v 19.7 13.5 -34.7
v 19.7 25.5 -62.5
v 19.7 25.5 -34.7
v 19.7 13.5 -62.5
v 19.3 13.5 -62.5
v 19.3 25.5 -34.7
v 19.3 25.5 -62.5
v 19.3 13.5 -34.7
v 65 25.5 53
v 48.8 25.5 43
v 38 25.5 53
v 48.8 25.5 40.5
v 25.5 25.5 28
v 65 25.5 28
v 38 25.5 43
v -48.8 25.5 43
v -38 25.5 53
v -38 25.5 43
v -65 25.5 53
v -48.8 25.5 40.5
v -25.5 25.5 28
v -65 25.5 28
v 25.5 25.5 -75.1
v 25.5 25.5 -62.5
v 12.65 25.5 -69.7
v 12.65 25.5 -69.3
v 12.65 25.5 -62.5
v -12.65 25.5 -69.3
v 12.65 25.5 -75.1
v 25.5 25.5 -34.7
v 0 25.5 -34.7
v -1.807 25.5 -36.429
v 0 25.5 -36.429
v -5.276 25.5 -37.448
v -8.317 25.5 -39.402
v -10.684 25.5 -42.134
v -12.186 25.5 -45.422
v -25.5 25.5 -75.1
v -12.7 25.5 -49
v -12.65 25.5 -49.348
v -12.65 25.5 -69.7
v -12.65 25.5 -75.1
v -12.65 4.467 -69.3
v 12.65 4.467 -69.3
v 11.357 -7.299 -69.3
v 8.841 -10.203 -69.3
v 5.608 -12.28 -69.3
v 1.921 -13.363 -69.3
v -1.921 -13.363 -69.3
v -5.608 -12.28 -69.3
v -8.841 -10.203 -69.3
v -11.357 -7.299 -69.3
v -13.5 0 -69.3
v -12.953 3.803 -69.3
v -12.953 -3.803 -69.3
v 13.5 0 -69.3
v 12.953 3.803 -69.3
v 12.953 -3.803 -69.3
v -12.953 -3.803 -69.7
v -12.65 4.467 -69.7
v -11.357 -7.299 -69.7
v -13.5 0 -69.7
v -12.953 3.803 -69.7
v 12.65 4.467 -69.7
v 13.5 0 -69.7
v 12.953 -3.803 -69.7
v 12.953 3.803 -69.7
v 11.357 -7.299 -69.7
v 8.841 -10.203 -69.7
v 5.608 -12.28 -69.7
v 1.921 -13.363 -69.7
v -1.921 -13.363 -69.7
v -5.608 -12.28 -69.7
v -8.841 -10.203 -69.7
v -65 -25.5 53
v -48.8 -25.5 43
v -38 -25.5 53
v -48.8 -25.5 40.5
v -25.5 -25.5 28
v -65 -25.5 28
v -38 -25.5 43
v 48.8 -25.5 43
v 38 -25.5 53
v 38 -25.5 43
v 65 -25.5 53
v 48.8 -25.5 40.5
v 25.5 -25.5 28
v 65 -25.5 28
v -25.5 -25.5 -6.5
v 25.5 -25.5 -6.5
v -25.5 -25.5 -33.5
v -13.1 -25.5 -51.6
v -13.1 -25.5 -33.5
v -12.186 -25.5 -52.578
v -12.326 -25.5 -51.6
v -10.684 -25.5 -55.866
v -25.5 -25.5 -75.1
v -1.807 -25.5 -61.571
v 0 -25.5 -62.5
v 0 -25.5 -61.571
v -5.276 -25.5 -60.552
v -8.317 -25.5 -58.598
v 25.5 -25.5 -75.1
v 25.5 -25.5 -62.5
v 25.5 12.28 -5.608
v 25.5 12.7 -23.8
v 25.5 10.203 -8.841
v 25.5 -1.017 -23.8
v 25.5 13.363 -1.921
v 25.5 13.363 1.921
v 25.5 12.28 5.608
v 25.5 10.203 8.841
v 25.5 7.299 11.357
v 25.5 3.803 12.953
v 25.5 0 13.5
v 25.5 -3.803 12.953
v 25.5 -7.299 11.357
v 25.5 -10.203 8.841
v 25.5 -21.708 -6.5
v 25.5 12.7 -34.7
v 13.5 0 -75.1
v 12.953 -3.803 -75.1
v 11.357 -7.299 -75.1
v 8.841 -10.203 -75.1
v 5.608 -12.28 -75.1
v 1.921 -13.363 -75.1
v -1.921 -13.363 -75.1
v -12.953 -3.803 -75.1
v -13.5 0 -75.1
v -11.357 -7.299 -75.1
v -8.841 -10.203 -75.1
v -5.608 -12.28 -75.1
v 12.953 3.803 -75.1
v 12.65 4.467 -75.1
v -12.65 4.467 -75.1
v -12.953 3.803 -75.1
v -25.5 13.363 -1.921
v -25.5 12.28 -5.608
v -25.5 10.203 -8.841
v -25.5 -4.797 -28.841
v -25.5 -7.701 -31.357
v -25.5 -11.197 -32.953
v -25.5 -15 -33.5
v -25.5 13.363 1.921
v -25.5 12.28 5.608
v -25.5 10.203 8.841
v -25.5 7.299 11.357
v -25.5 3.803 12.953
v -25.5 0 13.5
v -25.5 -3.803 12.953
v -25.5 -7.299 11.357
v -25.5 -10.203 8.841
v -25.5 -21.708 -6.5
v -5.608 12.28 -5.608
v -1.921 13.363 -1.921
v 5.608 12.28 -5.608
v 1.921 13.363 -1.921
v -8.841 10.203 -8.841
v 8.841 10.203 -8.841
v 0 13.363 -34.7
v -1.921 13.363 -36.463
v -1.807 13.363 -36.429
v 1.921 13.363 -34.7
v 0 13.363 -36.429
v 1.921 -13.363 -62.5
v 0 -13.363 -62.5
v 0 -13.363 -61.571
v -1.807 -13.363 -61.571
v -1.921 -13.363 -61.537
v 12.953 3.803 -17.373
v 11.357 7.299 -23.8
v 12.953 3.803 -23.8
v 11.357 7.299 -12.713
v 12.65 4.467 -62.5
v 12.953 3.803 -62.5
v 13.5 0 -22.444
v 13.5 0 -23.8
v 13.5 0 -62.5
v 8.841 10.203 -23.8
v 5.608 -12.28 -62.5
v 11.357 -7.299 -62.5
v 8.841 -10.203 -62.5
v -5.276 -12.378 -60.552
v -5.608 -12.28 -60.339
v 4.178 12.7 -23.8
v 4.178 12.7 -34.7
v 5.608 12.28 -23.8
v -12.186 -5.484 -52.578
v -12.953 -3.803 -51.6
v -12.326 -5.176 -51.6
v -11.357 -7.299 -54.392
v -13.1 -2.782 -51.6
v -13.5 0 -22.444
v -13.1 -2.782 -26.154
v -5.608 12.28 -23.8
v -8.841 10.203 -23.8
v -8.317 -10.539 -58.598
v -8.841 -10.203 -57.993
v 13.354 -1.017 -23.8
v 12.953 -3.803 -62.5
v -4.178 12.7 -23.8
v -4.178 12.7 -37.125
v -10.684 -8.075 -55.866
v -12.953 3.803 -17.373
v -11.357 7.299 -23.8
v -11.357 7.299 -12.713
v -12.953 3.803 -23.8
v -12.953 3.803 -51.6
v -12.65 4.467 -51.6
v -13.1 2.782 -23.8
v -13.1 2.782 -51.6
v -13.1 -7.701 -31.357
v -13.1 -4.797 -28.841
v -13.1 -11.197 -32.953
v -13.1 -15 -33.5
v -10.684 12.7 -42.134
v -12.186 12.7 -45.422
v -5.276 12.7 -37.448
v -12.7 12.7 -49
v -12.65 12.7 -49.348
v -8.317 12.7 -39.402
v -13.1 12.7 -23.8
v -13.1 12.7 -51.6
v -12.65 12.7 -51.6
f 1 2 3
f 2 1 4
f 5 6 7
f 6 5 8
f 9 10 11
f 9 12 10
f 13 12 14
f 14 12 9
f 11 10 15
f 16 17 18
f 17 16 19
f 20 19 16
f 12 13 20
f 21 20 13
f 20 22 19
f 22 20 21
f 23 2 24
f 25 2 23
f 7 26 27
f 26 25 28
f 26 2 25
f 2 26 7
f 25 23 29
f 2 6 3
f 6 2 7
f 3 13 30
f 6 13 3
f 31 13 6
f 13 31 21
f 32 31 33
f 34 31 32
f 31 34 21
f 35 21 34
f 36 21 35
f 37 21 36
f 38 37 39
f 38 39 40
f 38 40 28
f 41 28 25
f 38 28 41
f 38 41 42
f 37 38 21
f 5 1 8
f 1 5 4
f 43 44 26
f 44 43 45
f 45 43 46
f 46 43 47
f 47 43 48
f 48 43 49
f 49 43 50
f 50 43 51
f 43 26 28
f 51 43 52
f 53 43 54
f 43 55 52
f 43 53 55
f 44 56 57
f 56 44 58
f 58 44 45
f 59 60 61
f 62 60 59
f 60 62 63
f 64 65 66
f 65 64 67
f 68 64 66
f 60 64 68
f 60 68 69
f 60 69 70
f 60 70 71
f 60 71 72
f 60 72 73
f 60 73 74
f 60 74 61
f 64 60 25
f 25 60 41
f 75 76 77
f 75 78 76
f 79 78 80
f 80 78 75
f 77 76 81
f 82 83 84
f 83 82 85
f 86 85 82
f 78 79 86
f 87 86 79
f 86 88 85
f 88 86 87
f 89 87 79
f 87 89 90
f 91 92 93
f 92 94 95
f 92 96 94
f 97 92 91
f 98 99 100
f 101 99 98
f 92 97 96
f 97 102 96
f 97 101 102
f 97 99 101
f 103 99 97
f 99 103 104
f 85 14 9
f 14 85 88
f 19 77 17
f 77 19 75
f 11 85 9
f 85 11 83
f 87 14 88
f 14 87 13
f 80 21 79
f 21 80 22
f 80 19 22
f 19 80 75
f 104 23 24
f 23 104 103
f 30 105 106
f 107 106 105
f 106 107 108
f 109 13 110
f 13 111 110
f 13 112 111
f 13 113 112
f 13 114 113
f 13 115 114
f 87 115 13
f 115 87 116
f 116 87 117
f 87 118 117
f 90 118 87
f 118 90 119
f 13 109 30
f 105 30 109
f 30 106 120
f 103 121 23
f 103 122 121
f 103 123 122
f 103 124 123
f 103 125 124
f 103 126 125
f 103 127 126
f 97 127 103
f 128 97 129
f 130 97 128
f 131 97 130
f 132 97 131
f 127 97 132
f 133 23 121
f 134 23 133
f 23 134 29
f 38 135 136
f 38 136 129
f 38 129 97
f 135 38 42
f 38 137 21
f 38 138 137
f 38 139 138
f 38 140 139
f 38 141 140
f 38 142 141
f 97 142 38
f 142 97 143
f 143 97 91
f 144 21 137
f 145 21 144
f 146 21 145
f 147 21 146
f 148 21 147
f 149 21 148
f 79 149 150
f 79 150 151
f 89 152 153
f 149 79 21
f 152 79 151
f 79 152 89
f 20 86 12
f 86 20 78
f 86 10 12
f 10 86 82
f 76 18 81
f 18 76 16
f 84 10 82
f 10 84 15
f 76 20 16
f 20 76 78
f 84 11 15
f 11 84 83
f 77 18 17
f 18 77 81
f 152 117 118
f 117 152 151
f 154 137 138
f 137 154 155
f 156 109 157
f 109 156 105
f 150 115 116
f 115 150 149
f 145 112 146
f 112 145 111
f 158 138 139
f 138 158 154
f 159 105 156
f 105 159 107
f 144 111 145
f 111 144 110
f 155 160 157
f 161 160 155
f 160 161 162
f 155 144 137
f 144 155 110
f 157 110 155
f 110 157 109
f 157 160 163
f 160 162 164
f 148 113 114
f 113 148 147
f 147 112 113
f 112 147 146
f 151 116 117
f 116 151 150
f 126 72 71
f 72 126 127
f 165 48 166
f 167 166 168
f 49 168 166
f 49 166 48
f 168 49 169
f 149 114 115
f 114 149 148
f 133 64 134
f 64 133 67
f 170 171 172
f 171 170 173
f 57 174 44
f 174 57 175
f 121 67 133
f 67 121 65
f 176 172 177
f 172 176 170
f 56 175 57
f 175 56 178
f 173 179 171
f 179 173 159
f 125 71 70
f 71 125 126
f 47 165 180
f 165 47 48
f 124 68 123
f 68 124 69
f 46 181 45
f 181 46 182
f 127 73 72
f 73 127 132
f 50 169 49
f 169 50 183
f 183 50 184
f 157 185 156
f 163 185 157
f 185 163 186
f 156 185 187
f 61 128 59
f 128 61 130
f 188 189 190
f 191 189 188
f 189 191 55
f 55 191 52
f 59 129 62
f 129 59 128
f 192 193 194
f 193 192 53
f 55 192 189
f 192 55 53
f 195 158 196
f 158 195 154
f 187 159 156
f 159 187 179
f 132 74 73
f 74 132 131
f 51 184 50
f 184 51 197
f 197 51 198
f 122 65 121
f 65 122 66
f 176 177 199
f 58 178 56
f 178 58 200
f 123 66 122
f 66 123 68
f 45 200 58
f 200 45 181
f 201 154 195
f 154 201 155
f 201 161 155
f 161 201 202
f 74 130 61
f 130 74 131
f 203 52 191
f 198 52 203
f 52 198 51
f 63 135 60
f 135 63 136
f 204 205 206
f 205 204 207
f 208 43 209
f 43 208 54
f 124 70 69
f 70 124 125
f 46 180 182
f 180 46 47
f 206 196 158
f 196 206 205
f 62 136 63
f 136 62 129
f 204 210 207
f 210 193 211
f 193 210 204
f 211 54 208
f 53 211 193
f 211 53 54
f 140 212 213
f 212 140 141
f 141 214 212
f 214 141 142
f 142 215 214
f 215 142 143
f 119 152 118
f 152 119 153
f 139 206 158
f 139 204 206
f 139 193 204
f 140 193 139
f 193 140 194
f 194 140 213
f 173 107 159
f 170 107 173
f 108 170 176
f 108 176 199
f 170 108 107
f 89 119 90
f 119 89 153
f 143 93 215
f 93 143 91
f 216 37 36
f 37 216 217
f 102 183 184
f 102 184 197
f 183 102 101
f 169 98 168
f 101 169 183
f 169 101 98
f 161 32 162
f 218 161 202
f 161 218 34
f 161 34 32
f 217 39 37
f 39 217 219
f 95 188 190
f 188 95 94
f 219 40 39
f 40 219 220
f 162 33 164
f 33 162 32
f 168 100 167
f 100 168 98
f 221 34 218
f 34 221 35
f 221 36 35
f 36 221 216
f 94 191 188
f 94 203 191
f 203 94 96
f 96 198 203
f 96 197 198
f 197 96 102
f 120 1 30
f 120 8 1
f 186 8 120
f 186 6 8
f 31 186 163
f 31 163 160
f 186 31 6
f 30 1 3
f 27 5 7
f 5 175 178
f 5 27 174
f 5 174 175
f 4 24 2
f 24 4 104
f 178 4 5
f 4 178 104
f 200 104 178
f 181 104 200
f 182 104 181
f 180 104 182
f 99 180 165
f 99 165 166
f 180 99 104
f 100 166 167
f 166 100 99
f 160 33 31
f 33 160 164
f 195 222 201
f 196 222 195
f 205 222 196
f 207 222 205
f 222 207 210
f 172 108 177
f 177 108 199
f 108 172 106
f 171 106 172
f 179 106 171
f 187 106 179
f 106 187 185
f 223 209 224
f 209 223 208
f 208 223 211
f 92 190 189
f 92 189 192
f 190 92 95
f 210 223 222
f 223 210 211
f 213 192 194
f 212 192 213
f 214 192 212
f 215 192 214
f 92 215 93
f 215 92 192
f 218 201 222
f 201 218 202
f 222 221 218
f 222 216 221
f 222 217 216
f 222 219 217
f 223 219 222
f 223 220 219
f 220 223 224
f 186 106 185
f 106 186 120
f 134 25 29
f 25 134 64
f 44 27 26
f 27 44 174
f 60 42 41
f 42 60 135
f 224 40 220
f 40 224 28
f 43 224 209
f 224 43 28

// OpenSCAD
// [FL_INDEX: keywords="openscad, 3d_parametric, Signholderholder, csg_solid" | COT="Parametric OpenSCAD design from 3DCodeverse"]
// Title: Signholderholder

// Sign holder base depth.
sign_holder_depth=96;

// Sign holder thickness.
sign_holder_thickness=1.7;

// Bar diameter.
bar_dia=25.4;

// Wall thickness
wall=12;

// Space for hangers
hanger_space=15;

// Wiggle room.
wiggle=0.8;


/* [Hidden] */

inch=25.4;
holder_width = bar_dia+(wiggle+wall)*2;
holder_height = 90 +(wiggle+wall)*2;

module rack_top(w=0.0) {
  rotate([0,90,0])
    cylinder(r=bar_dia/2+w, h=150, center=true, $fn=22);
}
module rack_bottom(w=0.0) {
  translate([0,0,-100]) cylinder(r=bar_dia/2+w, h=100, $fn=22);
}

module rack(w=0.0) {
  rack_top(w);
  rack_bottom(w);
}


module sign(w = 0.0) {
  translate([0,-4.25*inch,0]) cube([3+w, 8.5*inch, 11*inch]);
  translate([-(sign_holder_depth/2)-wiggle,-4.25*inch,0])
   cube([sign_holder_depth+wiggle*2, 8.5*inch, sign_holder_thickness + w]);
}
% rack();
% translate([0,0,bar_dia/2 + wall + wiggle + hanger_space]) sign();

down_offset=20;
out_offset=15;

union() {

  translate([0,0,-50]) {
    translate([holder_width/2-wall/2,holder_width/2-wall/2,0]) 
    # cube([0.4,wall, bar_dia + wall], center=true);
    translate([0,0,-holder_width/2+wall/2]) 
    # cube([bar_dia + wall, holder_width, 0.4], center=true);
  }
  
  difference() {
    union() {
      translate([0,0,bar_dia/2 + wiggle + wall + hanger_space])
	cube([130, holder_width, 25], center=true);
      translate([0,0,bar_dia/2 + wiggle + wall -holder_height/2 + hanger_space])
	cube([holder_width, holder_width, holder_height], center=true);
    }

    translate([0,0,bar_dia/2 + wall + wiggle + hanger_space]) {
      sign(wiggle);
      translate([-38,-4.25*inch,0]) cube([96-20, 8.5*inch, 50]);
    }

    hull() {
      rack_top(wiggle);
      translate([0,-out_offset,-down_offset]) rack_top(wiggle);
    }
    hull() {
      translate([0,-out_offset,-down_offset]) rack_top(wiggle);
      translate([0,-30,-down_offset]) rack_top(wiggle);
    }

    rack(wiggle);

    // for (x=[0 : 10])
    translate([0,0,-49]) rotate([90,0,0]) translate([0,0,50]) rack_bottom();

    translate([0,-holder_width,-49-bar_dia/2-wiggle]) {
      cube([holder_width, holder_width*2, bar_dia+wiggle*3]);
    }
    translate([-bar_dia/2-wiggle/2,-holder_width+bar_dia/2,-bar_dia*2-wiggle]) {
      cube([holder_width, holder_width, bar_dia+wiggle*3]);
    }

    translate([-bar_dia/2+0.05,0,-holder_height+bar_dia]) {
      cube([bar_dia - 0.1, holder_width, holder_width-10]);
    }
  }
}
